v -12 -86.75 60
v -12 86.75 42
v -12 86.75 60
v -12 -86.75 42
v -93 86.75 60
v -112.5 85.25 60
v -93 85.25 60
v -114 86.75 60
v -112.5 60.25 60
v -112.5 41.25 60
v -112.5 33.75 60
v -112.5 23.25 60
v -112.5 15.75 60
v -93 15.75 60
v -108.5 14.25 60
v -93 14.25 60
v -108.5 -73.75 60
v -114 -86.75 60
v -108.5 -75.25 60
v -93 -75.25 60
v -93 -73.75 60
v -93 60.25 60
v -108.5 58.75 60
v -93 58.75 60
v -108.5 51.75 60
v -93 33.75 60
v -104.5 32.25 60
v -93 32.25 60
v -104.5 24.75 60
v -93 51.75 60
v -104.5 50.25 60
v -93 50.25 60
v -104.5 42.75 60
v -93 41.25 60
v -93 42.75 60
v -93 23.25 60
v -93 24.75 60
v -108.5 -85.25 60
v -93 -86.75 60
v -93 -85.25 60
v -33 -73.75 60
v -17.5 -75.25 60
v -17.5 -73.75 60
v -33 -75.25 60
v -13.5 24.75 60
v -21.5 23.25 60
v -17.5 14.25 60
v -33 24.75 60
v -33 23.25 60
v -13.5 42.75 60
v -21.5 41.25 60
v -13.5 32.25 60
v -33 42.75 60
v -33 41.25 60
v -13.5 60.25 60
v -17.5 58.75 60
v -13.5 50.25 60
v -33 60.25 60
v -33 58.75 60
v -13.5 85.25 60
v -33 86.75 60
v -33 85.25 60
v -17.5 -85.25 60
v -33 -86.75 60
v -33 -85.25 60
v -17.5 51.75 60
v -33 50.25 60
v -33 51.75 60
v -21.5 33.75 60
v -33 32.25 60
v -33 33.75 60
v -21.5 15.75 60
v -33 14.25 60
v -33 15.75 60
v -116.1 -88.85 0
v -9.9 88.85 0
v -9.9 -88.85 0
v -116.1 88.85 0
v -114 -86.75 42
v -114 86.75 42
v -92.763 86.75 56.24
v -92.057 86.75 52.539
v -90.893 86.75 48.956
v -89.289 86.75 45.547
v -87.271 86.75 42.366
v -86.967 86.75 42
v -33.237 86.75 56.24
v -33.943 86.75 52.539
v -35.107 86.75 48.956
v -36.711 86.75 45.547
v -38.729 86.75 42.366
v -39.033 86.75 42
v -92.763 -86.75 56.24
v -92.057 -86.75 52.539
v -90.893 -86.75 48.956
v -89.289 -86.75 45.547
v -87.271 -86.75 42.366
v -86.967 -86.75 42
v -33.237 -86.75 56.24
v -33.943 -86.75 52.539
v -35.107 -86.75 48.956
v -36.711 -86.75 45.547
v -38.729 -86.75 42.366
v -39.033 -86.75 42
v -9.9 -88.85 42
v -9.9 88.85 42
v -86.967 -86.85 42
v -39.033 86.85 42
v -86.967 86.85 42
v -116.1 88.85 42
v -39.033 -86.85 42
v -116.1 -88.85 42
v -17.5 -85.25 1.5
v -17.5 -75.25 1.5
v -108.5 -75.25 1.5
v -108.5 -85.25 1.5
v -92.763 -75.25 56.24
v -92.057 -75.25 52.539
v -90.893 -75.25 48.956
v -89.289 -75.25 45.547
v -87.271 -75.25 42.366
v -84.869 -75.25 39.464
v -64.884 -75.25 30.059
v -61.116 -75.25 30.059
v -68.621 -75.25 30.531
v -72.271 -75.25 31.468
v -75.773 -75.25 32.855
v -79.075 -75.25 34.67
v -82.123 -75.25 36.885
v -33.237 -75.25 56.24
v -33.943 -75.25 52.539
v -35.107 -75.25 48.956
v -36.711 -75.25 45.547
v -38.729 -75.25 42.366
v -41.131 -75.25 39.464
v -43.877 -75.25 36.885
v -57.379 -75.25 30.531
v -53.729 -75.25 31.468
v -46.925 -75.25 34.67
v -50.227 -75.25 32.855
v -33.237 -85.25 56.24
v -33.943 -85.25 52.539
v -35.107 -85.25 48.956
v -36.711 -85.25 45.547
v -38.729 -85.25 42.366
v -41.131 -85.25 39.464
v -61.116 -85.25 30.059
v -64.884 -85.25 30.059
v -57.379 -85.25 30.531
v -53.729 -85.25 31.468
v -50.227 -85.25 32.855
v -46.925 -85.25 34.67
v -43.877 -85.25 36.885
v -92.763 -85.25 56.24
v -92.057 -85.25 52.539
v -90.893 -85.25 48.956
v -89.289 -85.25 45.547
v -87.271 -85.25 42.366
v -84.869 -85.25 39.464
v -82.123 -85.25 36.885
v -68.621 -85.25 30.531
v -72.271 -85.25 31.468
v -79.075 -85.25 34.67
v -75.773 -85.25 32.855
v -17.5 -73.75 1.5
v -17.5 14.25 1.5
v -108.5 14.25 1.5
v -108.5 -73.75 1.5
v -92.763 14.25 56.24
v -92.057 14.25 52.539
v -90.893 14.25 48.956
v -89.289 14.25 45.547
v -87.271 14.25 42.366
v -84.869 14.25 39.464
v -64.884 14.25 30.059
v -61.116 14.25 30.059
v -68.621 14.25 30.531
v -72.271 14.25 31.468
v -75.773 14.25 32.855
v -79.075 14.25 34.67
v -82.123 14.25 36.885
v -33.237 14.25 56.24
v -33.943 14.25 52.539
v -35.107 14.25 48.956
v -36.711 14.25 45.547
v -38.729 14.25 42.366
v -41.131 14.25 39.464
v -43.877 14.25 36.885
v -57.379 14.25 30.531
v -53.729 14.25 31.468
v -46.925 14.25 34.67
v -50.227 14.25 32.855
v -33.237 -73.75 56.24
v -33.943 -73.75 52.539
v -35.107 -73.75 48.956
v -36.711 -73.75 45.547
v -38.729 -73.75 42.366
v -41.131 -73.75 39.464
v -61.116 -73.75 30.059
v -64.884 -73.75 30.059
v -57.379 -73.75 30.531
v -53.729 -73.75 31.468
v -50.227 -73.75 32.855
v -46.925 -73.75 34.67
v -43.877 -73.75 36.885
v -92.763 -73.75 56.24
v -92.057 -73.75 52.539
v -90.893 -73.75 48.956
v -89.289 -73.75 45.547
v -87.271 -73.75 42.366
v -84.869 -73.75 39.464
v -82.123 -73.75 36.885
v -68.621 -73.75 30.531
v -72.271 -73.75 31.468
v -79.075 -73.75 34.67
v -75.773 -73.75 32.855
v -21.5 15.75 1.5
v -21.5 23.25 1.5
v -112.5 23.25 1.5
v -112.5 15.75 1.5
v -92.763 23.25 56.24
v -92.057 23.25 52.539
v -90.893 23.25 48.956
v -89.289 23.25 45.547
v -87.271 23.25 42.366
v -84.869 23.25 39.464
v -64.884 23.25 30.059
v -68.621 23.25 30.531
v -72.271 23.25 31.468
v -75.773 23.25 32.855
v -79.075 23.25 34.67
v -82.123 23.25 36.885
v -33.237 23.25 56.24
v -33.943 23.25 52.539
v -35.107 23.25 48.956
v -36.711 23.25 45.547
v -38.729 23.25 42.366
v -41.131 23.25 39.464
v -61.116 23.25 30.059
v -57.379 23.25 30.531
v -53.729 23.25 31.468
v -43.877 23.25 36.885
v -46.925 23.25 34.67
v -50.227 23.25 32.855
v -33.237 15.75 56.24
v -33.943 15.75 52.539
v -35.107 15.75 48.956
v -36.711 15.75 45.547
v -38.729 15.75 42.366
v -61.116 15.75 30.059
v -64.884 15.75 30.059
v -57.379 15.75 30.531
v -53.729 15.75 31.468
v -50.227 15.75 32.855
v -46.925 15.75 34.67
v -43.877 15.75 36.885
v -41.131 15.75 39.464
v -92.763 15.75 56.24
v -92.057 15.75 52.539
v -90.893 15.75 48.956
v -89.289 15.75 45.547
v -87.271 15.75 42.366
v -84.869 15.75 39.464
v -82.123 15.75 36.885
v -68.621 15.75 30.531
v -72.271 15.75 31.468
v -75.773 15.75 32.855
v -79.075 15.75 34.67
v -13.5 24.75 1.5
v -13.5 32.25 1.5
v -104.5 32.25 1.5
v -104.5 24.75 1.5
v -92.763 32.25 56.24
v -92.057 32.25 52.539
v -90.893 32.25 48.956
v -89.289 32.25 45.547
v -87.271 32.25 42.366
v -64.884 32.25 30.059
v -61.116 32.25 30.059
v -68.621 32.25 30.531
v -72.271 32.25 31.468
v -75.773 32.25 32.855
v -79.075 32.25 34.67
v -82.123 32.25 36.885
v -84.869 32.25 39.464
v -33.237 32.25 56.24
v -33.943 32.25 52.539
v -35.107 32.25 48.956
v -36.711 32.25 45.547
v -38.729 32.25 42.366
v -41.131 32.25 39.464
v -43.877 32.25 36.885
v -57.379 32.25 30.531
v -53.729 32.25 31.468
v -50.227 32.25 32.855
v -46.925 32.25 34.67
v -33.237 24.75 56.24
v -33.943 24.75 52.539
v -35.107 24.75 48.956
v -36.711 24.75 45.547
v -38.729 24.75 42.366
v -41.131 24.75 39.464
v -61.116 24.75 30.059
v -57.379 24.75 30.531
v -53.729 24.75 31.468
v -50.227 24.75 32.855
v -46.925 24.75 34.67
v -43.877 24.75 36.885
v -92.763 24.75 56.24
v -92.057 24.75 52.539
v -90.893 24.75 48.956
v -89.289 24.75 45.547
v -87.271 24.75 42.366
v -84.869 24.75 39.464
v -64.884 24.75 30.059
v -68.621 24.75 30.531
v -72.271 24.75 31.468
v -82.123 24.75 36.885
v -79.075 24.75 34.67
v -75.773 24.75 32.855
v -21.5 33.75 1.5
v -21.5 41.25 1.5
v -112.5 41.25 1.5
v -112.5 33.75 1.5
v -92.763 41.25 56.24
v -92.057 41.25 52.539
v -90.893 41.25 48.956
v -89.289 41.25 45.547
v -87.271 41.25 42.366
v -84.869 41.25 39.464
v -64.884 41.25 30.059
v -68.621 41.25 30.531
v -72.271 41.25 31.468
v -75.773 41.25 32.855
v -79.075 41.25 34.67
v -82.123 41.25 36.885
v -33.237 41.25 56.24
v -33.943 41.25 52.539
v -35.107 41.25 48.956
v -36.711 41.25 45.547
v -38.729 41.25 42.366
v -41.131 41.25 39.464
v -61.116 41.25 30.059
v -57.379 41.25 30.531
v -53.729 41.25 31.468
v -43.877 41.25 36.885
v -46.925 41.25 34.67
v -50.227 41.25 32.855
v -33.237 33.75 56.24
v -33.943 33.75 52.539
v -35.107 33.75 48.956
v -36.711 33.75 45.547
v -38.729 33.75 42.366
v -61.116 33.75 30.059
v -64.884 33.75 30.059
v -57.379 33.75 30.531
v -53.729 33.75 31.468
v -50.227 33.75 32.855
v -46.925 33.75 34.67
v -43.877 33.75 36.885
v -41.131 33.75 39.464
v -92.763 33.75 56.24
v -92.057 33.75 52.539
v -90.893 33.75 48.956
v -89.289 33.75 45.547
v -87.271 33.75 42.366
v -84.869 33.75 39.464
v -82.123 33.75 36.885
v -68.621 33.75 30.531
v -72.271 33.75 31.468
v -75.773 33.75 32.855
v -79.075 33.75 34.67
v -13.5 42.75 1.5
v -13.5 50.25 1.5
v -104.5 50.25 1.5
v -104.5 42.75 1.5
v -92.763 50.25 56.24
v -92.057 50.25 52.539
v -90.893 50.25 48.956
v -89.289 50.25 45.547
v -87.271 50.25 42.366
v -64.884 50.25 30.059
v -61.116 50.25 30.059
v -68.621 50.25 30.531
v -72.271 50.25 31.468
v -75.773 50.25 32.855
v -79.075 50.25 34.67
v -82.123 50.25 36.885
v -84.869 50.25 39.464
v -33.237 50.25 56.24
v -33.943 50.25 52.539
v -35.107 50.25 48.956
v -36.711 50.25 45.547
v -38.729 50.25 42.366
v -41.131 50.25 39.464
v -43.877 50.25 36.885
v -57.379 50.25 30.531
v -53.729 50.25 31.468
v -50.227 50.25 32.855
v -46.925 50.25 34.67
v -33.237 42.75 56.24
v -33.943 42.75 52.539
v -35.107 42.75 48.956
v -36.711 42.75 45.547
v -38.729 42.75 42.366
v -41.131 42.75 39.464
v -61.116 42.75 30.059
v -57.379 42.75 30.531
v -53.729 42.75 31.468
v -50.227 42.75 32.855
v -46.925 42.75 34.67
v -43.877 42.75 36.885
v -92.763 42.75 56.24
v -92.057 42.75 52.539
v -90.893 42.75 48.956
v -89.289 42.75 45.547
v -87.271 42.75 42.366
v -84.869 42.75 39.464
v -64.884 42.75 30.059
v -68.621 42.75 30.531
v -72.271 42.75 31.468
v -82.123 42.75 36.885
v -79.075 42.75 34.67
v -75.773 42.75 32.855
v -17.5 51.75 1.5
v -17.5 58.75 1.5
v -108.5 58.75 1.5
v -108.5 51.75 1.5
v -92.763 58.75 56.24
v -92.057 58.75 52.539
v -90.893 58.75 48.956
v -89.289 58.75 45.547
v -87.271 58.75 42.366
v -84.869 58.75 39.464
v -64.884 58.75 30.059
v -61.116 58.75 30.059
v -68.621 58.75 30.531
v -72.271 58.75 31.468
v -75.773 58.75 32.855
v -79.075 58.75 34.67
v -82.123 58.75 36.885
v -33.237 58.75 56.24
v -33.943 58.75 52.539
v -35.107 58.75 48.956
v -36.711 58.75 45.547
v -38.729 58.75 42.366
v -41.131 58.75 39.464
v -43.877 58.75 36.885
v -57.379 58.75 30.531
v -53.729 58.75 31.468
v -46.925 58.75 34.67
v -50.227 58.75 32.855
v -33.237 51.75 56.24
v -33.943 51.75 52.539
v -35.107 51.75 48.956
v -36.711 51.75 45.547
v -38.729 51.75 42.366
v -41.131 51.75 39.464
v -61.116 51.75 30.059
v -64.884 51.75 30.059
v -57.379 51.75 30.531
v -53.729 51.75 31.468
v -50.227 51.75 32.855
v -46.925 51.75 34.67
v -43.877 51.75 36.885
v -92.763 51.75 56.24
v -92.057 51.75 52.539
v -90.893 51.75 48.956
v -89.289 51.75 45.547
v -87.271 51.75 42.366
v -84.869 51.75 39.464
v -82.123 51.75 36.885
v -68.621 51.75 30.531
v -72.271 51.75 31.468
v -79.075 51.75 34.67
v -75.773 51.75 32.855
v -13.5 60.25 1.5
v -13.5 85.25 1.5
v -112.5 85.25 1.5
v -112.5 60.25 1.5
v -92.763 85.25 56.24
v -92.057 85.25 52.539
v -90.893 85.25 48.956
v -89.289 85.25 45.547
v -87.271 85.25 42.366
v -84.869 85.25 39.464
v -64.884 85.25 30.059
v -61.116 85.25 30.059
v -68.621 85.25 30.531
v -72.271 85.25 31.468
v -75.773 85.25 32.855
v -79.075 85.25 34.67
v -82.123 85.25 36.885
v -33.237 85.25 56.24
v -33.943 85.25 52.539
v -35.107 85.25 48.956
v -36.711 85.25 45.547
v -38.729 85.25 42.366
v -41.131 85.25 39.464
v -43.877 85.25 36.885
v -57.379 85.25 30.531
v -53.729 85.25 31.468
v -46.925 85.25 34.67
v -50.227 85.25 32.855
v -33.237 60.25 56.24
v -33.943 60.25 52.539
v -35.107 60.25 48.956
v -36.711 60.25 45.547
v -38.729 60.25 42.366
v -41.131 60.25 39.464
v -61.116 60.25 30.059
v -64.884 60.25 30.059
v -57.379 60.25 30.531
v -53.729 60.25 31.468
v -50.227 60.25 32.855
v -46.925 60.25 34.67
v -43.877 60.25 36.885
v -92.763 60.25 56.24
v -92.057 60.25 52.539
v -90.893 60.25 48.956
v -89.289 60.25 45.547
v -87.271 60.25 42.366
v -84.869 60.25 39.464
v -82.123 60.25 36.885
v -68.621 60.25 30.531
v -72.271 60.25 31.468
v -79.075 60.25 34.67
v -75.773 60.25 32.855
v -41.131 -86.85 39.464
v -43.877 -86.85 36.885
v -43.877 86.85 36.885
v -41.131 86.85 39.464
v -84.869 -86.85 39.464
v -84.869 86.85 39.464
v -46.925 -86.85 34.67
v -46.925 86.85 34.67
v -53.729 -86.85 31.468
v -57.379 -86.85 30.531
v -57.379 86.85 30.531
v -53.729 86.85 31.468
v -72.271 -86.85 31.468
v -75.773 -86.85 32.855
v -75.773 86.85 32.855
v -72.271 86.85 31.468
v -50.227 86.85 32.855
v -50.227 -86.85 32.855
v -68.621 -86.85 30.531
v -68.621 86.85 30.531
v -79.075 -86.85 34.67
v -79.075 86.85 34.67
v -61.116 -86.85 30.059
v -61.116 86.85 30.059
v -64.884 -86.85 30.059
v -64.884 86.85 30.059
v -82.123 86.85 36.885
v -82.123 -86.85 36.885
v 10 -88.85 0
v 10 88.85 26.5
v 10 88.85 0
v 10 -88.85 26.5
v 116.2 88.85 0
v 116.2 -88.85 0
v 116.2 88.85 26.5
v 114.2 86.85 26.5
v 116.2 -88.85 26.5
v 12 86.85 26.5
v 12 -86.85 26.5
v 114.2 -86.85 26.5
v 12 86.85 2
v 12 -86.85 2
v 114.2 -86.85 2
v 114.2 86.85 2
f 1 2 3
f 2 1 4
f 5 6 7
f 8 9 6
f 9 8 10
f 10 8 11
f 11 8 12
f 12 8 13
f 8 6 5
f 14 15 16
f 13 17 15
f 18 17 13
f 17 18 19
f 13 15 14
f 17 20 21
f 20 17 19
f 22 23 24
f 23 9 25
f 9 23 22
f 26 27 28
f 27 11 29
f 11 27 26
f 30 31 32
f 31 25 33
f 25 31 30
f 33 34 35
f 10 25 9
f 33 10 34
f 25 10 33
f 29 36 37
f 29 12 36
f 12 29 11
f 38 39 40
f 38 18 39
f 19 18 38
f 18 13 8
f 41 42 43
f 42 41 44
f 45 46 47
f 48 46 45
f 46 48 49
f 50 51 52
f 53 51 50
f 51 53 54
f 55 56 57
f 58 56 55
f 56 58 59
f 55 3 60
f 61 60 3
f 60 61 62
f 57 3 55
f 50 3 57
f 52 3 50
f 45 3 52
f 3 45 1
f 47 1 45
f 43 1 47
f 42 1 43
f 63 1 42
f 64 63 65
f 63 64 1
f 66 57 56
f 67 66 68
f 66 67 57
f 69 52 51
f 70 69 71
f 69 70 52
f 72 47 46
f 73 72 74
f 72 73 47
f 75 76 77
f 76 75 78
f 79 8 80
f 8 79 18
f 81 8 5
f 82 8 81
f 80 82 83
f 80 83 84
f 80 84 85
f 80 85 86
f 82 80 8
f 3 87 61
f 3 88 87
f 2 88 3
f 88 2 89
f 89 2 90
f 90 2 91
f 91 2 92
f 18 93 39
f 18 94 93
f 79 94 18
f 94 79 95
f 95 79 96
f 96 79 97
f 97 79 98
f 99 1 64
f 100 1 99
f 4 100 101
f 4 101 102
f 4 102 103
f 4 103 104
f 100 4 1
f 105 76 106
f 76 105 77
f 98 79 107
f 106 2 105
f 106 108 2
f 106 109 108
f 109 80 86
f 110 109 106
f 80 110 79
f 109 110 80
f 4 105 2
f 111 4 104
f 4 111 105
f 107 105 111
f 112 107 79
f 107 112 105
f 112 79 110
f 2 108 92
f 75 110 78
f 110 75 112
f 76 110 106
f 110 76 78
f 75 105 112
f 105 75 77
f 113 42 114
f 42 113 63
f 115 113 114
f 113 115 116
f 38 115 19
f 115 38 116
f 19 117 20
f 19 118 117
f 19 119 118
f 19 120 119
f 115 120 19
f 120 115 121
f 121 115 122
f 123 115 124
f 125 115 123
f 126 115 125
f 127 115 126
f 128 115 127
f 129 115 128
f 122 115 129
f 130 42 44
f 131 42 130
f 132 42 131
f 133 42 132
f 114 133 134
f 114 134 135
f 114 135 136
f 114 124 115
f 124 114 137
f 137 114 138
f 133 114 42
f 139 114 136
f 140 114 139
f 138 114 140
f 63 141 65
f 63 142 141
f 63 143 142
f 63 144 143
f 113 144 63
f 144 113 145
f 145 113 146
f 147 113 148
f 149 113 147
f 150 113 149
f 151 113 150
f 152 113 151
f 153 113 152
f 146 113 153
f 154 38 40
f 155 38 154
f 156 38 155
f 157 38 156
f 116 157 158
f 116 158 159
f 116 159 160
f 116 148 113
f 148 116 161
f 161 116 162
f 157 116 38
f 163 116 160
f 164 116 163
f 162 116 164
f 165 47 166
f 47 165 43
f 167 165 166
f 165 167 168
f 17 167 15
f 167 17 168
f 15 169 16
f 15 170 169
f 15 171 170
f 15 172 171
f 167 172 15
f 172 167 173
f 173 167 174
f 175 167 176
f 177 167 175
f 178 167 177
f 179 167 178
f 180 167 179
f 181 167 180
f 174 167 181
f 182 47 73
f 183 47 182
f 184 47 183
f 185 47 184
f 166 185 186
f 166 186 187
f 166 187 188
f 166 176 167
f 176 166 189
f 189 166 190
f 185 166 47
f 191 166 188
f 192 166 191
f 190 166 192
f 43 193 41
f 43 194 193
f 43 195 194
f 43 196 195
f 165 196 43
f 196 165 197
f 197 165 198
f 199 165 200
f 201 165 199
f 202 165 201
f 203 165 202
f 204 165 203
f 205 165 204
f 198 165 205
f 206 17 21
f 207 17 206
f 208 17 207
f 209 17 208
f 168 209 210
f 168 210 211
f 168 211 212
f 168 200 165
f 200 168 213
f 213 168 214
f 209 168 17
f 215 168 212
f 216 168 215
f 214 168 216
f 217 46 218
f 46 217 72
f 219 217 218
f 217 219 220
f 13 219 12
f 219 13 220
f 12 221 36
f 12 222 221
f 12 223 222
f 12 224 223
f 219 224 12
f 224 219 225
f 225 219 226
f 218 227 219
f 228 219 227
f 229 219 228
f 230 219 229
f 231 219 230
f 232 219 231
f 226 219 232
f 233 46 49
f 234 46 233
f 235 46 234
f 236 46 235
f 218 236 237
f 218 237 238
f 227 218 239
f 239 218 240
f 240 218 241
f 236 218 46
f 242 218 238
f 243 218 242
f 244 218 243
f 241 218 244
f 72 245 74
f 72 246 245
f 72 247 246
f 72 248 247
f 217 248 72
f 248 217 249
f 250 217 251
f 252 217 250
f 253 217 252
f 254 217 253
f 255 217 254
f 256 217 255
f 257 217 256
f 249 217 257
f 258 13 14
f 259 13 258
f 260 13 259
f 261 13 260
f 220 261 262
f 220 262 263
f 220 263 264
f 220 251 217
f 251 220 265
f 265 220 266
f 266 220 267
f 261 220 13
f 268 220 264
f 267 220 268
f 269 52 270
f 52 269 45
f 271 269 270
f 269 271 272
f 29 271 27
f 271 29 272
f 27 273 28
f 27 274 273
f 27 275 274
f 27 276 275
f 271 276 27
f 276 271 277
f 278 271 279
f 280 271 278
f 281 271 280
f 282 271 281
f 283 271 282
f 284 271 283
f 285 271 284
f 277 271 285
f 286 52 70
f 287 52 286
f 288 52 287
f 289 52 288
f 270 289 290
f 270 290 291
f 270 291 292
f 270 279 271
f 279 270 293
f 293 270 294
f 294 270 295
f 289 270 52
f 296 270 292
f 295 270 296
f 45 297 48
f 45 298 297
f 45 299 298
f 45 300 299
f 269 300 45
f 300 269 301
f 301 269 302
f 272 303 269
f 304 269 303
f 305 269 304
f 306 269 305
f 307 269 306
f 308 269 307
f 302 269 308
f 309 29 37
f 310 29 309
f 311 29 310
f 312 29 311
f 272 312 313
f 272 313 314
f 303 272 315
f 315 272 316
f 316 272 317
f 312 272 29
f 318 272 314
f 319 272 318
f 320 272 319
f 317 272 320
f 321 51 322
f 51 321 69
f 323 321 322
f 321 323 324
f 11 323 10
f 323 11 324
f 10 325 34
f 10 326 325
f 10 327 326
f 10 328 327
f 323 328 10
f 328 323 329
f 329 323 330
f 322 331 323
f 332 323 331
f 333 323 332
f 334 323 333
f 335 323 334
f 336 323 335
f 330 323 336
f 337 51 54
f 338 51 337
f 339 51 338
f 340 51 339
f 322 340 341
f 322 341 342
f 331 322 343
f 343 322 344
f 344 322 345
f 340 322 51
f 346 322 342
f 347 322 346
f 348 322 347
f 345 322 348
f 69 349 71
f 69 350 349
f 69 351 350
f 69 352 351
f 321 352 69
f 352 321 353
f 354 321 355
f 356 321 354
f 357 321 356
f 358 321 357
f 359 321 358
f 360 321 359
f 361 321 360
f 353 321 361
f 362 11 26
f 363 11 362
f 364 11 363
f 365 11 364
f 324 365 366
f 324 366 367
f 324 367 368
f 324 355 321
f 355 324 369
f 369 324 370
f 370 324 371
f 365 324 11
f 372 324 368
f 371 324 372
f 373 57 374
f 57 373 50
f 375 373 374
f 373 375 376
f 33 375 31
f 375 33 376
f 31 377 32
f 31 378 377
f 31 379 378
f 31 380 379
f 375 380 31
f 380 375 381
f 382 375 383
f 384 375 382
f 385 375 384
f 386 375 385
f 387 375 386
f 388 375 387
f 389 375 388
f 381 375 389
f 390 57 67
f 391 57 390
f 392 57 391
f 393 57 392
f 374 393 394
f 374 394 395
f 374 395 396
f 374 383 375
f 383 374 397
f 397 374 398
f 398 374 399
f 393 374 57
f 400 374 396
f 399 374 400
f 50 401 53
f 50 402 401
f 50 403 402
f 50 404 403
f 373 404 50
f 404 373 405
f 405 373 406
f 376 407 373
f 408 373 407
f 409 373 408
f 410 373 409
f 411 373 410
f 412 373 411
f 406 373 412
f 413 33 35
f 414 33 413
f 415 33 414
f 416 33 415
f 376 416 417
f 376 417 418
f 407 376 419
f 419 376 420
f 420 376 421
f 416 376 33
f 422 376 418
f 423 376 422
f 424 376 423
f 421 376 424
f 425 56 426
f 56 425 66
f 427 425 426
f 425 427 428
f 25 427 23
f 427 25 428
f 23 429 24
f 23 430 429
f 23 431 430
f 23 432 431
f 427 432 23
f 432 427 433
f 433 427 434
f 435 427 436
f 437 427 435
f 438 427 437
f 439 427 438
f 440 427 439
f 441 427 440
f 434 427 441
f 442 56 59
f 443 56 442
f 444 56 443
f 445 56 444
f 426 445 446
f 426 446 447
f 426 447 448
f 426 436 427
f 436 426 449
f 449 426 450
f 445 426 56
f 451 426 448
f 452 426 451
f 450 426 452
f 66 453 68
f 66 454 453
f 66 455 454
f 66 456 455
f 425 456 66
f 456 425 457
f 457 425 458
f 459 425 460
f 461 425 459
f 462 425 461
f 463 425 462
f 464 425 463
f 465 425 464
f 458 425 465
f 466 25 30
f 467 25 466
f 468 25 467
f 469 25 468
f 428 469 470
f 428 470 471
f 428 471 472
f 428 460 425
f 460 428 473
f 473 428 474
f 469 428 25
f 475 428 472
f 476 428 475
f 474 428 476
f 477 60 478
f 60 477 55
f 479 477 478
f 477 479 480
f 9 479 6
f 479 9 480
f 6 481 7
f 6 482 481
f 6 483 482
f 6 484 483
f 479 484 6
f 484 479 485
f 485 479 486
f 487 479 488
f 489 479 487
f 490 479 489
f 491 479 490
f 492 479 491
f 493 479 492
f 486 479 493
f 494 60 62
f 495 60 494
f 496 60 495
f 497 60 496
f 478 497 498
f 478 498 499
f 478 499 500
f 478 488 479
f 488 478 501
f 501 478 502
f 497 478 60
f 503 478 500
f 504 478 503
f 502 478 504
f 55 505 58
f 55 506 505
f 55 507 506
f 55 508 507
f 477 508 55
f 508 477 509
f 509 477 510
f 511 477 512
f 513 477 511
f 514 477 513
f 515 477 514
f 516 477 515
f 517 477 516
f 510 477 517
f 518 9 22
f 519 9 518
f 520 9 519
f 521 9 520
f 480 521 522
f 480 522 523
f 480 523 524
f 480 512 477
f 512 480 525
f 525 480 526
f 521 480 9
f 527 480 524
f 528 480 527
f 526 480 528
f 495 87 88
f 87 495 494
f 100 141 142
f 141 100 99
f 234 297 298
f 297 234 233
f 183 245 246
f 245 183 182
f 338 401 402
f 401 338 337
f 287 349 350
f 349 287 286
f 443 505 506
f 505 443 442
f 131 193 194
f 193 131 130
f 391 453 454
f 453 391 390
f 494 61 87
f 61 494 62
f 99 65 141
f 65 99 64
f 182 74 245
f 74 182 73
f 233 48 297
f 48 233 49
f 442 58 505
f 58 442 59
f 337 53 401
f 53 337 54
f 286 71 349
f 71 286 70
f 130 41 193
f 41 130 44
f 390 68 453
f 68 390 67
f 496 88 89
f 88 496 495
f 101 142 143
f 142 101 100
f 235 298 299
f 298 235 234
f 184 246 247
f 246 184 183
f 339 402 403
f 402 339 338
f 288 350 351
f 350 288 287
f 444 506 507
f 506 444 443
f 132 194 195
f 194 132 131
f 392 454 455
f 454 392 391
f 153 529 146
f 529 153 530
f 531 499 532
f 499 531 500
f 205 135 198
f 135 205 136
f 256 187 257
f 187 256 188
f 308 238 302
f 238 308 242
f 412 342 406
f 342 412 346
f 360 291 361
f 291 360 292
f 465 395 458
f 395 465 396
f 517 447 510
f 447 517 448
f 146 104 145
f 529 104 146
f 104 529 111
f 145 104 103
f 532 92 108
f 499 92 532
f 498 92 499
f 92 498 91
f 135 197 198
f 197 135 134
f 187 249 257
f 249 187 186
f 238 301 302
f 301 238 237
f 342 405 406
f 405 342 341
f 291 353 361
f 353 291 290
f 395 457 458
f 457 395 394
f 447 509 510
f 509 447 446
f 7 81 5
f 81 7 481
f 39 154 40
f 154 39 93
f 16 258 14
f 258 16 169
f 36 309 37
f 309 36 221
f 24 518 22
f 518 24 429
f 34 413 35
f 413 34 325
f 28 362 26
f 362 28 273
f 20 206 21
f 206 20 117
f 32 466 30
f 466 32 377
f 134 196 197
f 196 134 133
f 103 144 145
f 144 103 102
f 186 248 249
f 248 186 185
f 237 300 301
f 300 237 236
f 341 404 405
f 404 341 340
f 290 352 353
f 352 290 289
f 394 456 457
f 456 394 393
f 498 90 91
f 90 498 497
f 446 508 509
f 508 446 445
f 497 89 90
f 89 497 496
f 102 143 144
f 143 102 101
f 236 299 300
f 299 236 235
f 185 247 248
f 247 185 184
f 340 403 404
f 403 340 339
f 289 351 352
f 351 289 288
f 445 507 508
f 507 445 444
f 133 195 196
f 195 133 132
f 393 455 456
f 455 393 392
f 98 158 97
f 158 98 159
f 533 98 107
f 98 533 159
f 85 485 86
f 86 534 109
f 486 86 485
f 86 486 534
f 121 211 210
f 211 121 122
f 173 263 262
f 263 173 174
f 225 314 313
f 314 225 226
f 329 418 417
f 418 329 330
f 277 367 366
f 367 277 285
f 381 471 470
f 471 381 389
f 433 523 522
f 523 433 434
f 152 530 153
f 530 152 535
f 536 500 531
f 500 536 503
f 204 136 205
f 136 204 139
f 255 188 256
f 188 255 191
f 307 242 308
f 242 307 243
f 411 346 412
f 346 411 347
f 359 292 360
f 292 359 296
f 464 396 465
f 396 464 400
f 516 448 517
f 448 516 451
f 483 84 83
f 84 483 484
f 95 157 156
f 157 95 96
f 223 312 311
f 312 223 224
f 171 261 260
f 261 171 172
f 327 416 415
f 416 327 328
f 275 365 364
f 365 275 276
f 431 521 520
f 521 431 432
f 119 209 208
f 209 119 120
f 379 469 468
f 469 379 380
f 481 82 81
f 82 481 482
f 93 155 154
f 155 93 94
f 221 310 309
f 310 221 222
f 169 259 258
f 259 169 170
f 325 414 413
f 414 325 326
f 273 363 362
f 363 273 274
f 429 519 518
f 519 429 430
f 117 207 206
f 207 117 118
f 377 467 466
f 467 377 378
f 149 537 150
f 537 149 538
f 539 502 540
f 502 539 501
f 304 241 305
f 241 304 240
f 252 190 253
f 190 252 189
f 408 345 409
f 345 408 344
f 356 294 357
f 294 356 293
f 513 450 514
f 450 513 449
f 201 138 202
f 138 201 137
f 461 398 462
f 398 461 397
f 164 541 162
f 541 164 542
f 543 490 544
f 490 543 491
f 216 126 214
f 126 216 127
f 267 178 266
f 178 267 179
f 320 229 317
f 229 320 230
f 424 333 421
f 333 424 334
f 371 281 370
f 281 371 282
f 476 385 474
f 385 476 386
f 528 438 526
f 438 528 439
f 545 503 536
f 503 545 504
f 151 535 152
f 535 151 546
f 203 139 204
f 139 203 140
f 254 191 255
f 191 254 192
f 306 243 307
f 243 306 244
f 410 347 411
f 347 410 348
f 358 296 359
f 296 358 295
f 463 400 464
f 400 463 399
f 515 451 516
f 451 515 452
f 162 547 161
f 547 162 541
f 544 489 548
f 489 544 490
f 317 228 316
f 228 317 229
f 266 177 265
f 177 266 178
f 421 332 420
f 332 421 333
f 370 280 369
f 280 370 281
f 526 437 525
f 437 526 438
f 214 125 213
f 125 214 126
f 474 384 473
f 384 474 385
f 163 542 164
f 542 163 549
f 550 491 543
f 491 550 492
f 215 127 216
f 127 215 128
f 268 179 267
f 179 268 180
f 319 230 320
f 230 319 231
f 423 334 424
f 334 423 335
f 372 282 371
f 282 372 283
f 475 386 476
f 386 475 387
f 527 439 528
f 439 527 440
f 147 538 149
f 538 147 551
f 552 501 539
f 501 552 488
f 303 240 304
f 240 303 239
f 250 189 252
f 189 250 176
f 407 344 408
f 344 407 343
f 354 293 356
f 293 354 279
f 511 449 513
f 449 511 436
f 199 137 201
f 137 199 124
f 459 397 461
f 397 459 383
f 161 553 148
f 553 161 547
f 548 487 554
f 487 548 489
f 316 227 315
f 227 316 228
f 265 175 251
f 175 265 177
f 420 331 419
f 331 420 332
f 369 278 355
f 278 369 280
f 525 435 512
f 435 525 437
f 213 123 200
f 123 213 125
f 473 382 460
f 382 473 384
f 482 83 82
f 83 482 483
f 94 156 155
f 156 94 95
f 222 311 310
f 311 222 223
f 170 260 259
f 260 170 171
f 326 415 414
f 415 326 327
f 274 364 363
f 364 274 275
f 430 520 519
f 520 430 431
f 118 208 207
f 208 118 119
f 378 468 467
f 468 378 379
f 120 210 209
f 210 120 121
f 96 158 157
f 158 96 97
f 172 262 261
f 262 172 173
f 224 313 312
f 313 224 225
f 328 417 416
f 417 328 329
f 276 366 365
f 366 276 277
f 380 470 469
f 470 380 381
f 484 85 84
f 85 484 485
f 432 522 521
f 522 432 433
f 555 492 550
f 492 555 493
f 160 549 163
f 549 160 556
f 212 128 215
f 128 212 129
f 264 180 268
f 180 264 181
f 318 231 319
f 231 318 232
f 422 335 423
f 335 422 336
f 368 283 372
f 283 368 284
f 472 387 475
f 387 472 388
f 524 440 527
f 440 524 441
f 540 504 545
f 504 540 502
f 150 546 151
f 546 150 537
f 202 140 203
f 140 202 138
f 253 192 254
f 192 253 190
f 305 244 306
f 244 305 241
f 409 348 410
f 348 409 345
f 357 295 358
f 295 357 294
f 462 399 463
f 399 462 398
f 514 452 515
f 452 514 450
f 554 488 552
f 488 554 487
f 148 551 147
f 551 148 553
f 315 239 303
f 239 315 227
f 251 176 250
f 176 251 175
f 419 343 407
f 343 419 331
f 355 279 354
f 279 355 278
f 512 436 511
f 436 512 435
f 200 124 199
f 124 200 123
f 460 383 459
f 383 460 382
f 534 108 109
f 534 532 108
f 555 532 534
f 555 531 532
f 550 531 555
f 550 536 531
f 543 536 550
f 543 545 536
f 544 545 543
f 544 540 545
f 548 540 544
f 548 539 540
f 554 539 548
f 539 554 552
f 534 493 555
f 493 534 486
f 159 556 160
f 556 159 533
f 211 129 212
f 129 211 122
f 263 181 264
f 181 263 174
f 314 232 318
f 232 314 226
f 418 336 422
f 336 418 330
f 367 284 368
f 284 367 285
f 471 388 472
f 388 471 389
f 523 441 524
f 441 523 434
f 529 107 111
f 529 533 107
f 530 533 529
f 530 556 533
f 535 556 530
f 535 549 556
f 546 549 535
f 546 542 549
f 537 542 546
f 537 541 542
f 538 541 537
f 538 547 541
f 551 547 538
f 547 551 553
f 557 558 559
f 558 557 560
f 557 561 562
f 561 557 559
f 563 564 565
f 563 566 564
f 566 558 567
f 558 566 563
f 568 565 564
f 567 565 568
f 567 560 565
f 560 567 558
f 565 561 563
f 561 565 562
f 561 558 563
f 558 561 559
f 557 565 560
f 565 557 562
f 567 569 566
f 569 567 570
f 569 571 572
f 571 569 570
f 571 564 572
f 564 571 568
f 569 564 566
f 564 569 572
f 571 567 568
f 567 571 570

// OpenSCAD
outputs = "both"; // [cover:Cover Only,caddy:Caddy Only,both:Caddy and Cover]

// A value of 0 will use the widest compartment width as the overall width of the box
minimum_box_width=0;
// A value of 0 will use the combined thickness of all the compartments and appropriate dividers.
minimum_box_length=0;
// Thickness of the dividers separating the individual pockets
divider_thickness=1.5;
// This will determine how high the body walls will go. This value must be lower than the compartment height.
divider_height=60;
// Use compartment_width in the pocket array if compartments are all the same size
compartment_width=91;
// Use compartment_height in the pocket array if compartments are all the same size
compartment_height=64;
// The thickness of each wall (Not counting the lip thickness)
wall_thickness_minimum=1.5;

// For easy content removal
finger_groove_radius=30;

// A single groove that cuts through all pockets, or a hole under each pocket
finger_groove_type="horizontal";//[none:none, horizontal:horizontal, vertical:vertical]

// Amount of height to add to the top cover
cover_top_clearance=1;
// Amount of material to add to the sides of the cover's sides and lip thickness
cover_side_clearance=.1;

// Serves as the stopper for the cover, preventing the cover from squishing the top of the compartments
caddy_lip = "yes"; // [no:no, yes:yes]

// Height of the lip. A higher value means less material needed for the cover
lip_height=42;

// Thickness of the caddy lip. Also determines the thickness of the cover walls.
lip_thickness = 2;



// A vector of pockets defined by [width,thickness,height, alignment(<0:left , 0:center, >0:right)]
pockets=[[compartment_width,  10, compartment_height],[compartment_width, 88, compartment_height], [compartment_width, 7.5, compartment_height, -1],[compartment_width, 7.5, compartment_height,  1],[compartment_width, 7.5, compartment_height, -1],[compartment_width, 7.5, compartment_height,  1],[compartment_width,  7, compartment_height],[99,  25, compartment_height]];

starRealms = 
    [
        //explorers
        [compartment_width,  10, compartment_height], //10
        
        //main
        [compartment_width, 88, compartment_height], //88
        
        //player decks x4
        [compartment_width, 7.5, compartment_height,    -1], 
        [compartment_width, 7.5, compartment_height,     1],
        [compartment_width, 7.5, compartment_height,    -1],
        [compartment_width, 7.5, compartment_height+15,  1],
        
        //missions and gambits
        [compartment_width,   7, compartment_height], 
        
        //accessories
        [               99,  25, compartment_height]  
    ];

epicSpellWars = 
    [
        [60, 30, 20],
        [60, 30, 20]
    ];
compartments=pockets?pockets:starRealms;

function getAxisValuesFromVectorArray(v, a) = 
    [ for (i = [0: len(v) - 1]) v[i][a] ];

function addToVector(v, s) =
    [ for (i = [0: len(v) - 1]) v[i] + s ];

function sumPrevious(v, i, s=0) = 
    (i==s ? v[i] : v[i] + sumPrevious(v, i-1, s));
    
function getOffsets(v,s=0)=
    [ for (i = [0 : len(v)]) i==0 ? 0 : sumPrevious(v, i-1)+s ];


// ** compartments **
echo (compartments);
yValues = getAxisValuesFromVectorArray(compartments, 1);    
echo (yValues);
yValuesWithDividerThickness = addToVector(yValues, divider_thickness);    
echo (yValuesWithDividerThickness);
offsets = getOffsets(yValuesWithDividerThickness,0);    
echo ("Offsets:");
echo (offsets);


// ** body **
boxWidth=max(max(getAxisValuesFromVectorArray(compartments, 0)),minimum_box_width);
boxLength=max(minimum_box_length,offsets[len(offsets)-2] + yValues[len(yValues)-1]);
boxBody = [
    boxWidth + wall_thickness_minimum*2,
    boxLength + wall_thickness_minimum*2,
    divider_height
];
compartmentBlockWidth  = max(getAxisValuesFromVectorArray(compartments, 0));
compartmentBlockDepth  = boxLength;
compartmentBlockHeight = max(getAxisValuesFromVectorArray(compartments, 2));


// ** lip **
lip = [
    boxBody[0] + lip_thickness*2 + cover_side_clearance*2,
    boxBody[1] + lip_thickness*2 + cover_side_clearance*2,
    lip_height,
];

// ** cover **
cover = [
    boxBody[0] + lip_thickness*2 + cover_side_clearance*2,
    boxBody[1] + lip_thickness*2 + cover_side_clearance*2,
    compartmentBlockHeight + lip_thickness + wall_thickness_minimum-lip_height +cover_top_clearance
];

// ** cover cavity **
coverCavity = [
    cover[0] - lip_thickness*2,
    cover[1] - lip_thickness*2,
    cover[2] - cover_top_clearance
];

module body(){    
    difference(){
        union(){
            translate (-[boxBody[0]/2,boxBody[1]/2,0])
                cube(size=boxBody);
            if(caddy_lip=="yes"){
                translate ([-(lip[0]/2),-lip[1]/2,0])
                    //color([0,0,1])
                    cube(size=lip);
            }
        }
        translate ([0,-compartmentBlockDepth/2,0])
        union(){
            for (i=[0:1:len(compartments)-1]) 
                translate([
                    -compartments[i][0]/2 +
                    // ** stagger **
                    (
                        compartments[i][3]<0?
                         (compartments[i][0] - boxBody[0])/2+wall_thickness_minimum:
                        compartments[i][3]>0?
                        -(compartments[i][0] - boxBody[0])/2-wall_thickness_minimum
                        :0
                    ),
                    offsets[i],
                    wall_thickness_minimum
                ])
                cube( size=[
                    compartments[i][0],
                    compartments[i][1],
                    compartmentBlockHeight
                ]);
            ;
                
            // ** Finger Groove
            if (finger_groove_type=="vertical") {
                for (i=[0:1:len(compartments)-1]) 
                    translate([
                        0,
                        offsets[i]+compartments[i][1]/2,
                        -1
                    ])
                    color([0,1,0])
                    cylinder(h = compartmentBlockHeight, r=finger_groove_radius, center = false, $fn=50);
                ;
            }
            // ** debugger **
            //color([0,0,1])
            //translate([-compartmentBlockWidth/2,0,wall_thickness_minimum])
            //cube([compartmentBlockWidth,compartmentBlockDepth,compartmentBlockHeight]);
            
        }
        
        // ** Finger Groove
        if (finger_groove_type=="horizontal") {
            translate( [0,-coverCavity[1]/2,divider_height] )
            rotate([270,0,0])
                cylinder(h = coverCavity[1], r=finger_groove_radius, center = false, $fn=50);
        }
    }
}

module cover(){   
    translate ([0,0,cover[2]+lip_height])
    rotate([0,180,0])
    difference(){
        // Cover Body
        translate([
            -(cover[0] )/2, 
            -cover[1]/2, 
            lip_height
        ])
            cube(cover);
    
        // Inner Cavity
        translate([
            -coverCavity[0]/2,
            -coverCavity[1]/2, 
            lip_height-1
        ])
            cube(coverCavity);
    }
    echo(cover);
}

print_part();
module print_part() {
	if (outputs == "cover") {
        cover();
	} else if (outputs == "caddy") {
        body();
	} else if (outputs == "both") {     
        translate ([-boxBody[0]/2 - 10 -lip_thickness, 0, 0]) 
            body();
        translate ([cover[0]/2+10,0,0])
            cover();
	} else {
		both();
	}
}
